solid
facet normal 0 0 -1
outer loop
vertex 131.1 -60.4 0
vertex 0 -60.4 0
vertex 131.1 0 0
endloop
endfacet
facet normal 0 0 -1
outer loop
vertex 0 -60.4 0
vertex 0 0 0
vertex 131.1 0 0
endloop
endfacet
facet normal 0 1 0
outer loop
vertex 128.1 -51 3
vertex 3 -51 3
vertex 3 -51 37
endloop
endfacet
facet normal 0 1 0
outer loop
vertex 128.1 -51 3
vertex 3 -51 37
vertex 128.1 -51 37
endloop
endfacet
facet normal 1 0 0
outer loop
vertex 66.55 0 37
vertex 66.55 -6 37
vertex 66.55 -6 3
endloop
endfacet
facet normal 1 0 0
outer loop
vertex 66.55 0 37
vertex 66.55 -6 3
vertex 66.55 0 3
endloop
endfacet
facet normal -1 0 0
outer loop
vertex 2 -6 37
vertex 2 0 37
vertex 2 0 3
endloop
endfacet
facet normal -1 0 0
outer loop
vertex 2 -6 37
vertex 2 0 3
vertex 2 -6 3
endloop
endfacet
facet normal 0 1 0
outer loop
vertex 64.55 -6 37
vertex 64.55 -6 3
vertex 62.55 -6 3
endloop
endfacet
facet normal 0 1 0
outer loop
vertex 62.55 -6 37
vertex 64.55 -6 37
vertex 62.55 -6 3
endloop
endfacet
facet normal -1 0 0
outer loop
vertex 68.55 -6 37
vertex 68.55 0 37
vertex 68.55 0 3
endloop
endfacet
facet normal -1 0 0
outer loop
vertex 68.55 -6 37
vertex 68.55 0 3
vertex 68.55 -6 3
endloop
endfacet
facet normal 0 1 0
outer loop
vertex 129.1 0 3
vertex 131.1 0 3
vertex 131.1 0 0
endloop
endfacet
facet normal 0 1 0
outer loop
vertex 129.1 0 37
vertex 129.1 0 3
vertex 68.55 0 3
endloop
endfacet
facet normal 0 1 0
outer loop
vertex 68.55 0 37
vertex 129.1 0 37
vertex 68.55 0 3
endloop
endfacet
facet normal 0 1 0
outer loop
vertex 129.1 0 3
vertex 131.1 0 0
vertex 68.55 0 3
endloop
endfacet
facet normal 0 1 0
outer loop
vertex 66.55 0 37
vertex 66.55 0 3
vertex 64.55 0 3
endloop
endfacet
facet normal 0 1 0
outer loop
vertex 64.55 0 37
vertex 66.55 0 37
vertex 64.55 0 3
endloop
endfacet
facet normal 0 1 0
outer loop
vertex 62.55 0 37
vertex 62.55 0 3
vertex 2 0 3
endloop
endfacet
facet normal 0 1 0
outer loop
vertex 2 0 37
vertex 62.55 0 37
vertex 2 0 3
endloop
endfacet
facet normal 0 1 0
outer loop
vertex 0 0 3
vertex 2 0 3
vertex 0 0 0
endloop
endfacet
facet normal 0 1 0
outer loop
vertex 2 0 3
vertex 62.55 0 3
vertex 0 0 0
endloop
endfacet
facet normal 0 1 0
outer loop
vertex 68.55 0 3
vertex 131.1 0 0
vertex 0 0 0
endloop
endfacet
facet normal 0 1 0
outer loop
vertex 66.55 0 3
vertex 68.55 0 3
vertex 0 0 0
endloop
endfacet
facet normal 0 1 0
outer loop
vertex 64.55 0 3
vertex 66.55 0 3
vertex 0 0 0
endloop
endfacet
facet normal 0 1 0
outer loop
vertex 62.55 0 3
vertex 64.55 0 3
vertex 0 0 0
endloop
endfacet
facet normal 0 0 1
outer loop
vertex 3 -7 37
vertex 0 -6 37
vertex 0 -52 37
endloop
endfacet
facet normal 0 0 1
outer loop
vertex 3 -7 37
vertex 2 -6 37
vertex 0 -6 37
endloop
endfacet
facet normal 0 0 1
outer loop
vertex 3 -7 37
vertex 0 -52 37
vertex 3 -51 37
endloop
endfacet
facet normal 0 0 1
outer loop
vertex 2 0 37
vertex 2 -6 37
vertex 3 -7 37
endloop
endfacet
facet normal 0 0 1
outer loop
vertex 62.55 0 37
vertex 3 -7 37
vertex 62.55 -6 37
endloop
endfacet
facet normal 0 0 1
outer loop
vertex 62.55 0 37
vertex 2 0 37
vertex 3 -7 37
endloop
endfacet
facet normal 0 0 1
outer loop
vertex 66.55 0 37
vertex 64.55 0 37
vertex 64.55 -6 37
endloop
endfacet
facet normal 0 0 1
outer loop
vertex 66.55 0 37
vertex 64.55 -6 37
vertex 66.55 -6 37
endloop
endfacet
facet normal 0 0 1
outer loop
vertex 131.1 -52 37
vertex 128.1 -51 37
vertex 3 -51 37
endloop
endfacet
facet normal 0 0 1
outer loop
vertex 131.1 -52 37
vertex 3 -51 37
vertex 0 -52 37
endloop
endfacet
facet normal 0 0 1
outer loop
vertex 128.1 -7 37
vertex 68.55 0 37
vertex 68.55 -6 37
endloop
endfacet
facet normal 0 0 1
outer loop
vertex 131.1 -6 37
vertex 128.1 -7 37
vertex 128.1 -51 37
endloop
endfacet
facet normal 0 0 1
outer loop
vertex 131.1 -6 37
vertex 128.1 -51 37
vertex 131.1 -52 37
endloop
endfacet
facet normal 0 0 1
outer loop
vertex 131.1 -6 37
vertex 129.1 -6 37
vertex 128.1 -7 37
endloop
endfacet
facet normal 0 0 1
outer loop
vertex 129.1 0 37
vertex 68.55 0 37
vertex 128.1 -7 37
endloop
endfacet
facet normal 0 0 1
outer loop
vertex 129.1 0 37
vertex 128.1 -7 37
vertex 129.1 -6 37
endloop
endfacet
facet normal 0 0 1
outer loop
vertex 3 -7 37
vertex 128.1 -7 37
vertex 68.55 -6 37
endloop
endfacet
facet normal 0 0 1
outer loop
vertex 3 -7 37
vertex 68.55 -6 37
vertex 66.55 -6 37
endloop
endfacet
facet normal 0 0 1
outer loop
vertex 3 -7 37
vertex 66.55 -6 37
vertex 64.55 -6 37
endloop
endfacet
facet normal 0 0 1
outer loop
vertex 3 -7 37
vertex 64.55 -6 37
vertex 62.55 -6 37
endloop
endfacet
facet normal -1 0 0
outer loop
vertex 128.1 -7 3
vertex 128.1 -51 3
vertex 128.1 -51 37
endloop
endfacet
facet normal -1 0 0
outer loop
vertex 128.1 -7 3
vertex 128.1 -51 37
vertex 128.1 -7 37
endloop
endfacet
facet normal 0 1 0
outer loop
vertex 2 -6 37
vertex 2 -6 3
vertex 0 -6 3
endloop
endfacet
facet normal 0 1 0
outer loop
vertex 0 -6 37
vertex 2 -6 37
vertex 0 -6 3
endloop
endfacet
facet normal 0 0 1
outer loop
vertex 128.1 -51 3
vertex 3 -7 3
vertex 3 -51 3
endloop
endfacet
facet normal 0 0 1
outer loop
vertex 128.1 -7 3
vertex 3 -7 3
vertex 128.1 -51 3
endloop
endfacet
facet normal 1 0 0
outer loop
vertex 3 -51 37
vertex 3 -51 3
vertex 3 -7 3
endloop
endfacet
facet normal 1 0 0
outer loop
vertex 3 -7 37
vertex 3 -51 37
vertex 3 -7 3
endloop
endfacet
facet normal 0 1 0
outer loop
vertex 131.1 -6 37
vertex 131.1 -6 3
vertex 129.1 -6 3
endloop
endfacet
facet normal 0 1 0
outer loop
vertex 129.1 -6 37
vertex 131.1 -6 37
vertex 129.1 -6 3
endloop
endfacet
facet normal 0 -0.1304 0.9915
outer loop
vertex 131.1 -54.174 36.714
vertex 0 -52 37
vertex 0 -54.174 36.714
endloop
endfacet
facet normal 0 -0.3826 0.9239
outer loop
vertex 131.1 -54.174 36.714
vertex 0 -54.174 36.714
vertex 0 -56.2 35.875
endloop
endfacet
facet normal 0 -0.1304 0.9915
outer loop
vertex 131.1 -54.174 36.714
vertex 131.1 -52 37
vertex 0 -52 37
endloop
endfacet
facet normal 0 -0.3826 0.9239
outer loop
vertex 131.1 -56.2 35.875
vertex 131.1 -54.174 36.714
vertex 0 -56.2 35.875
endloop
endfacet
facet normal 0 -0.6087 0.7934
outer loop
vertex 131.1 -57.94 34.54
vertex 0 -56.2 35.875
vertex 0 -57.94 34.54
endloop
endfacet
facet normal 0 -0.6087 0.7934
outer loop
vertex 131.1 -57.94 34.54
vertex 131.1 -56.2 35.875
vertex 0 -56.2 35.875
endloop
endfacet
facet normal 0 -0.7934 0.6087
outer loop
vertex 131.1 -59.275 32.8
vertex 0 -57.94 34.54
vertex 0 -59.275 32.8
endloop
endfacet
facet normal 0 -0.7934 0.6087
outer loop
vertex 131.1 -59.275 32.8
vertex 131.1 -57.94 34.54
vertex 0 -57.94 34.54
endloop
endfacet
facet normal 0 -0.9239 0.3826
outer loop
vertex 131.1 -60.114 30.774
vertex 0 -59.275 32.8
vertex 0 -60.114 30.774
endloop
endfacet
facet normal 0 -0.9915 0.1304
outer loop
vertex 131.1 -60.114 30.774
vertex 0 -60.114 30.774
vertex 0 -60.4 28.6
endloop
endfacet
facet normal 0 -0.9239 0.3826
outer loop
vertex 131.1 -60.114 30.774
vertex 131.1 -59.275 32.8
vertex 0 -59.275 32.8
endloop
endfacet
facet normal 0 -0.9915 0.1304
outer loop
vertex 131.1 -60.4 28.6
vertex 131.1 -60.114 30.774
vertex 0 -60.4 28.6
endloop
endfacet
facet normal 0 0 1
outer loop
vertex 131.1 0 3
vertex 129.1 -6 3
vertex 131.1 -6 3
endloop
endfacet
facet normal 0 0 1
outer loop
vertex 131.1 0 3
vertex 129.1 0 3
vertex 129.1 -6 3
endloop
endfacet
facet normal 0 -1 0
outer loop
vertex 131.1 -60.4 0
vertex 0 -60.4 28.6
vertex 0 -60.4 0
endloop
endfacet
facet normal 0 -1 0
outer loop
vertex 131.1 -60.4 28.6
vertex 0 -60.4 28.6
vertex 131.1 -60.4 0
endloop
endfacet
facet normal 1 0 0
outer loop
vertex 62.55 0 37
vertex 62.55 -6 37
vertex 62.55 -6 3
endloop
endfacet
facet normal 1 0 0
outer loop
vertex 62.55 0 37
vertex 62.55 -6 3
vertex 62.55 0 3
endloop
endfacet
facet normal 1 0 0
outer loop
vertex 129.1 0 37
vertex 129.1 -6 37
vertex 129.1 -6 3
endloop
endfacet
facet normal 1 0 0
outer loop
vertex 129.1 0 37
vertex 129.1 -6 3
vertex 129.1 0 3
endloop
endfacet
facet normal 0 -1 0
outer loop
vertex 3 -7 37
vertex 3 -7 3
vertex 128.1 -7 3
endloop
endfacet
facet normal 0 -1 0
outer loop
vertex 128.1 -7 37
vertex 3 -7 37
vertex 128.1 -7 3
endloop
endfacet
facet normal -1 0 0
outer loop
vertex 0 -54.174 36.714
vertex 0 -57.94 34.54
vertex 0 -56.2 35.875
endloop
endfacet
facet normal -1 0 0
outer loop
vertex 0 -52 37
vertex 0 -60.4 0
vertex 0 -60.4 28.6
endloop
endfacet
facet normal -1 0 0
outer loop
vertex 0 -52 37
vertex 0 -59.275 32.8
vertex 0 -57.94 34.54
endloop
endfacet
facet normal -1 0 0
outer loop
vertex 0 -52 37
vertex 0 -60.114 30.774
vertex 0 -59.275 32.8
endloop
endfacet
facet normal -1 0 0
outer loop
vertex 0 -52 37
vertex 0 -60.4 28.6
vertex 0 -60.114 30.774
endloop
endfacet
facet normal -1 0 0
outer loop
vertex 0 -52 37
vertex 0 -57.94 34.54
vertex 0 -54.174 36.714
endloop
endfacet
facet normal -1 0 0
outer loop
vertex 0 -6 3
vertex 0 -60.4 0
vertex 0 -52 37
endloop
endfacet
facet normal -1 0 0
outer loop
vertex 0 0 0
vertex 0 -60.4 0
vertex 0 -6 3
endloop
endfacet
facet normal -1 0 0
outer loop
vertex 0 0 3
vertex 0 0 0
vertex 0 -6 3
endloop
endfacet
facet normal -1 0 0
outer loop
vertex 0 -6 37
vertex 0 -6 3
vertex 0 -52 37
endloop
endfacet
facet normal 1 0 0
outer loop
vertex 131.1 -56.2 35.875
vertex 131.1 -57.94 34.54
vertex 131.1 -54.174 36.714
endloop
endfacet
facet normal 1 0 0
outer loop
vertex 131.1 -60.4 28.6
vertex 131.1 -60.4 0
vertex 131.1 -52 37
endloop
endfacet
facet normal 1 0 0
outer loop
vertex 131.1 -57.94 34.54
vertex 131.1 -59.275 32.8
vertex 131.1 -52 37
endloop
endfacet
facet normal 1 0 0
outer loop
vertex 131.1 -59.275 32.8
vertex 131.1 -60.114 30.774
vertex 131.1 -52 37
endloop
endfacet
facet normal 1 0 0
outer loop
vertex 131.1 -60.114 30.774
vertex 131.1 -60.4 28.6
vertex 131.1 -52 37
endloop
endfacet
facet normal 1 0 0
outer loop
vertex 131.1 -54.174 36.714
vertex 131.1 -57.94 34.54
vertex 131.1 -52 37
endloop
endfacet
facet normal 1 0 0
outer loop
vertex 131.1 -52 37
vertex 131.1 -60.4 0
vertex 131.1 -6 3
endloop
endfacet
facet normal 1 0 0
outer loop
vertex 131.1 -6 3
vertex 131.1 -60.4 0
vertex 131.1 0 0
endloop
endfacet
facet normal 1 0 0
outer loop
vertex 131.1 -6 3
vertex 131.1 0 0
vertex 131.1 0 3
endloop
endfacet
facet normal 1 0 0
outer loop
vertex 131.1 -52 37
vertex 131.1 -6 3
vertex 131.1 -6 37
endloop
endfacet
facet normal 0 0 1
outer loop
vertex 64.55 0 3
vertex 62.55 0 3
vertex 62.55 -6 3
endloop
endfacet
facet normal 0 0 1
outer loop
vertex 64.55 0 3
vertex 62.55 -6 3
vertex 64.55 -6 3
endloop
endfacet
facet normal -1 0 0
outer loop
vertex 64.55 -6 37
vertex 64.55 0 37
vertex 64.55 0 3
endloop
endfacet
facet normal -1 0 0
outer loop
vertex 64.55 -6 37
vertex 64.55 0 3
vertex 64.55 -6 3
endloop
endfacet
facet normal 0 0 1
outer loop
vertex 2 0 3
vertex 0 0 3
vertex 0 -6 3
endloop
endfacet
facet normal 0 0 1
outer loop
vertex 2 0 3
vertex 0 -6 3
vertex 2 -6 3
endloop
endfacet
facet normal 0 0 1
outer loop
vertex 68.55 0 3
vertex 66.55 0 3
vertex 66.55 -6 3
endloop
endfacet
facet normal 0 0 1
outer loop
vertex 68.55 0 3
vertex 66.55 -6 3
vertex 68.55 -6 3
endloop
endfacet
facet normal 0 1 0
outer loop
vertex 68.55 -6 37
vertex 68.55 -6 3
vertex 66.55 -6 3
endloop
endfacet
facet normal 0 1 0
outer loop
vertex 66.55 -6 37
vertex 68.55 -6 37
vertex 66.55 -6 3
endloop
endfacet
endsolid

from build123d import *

# Parameters (mm, degrees)
CROQUIS2_W              = 131.1
CROQUIS2_H              = 54
SALIENTE_EXTRUIR2_DEPTH = 3
CROQUIS3_W              = 125.1
CROQUIS3_H              = 44
SALIENTE_EXTRUIR3_DEPTH = 34
CROQUIS4_W              = 131.1
CROQUIS4_H              = 37
SALIENTE_EXTRUIR4_DEPTH = 6.4
REDONDEO2_R             = 8.4


with BuildPart() as part:
    # Croquis2 → Saliente-Extruir2 (new body)
    with BuildSketch(Plane.XY):
        with Locations((65.55, -27)):
            Rectangle(CROQUIS2_W, CROQUIS2_H)
    extrude(amount=SALIENTE_EXTRUIR2_DEPTH)

    # Croquis3 → Saliente-Extruir3 (add)
    with BuildSketch(Plane.XY.offset(3)):
        Polygon((2, -6), (0, -6), (0, -54), (131.1, -54), (131.1, -6), (129.1, -6), (129.1, 0), (68.55, 0), (68.55, -6), (66.55, -6), (66.55, 0), (65.55, 0), (64.55, 0), (64.55, -6), (62.55, -6), (62.55, 0), (2, 0), align=None)
        with Locations((65.55, -29)):
            Rectangle(CROQUIS3_W, CROQUIS3_H, mode=Mode.SUBTRACT)
    extrude(amount=SALIENTE_EXTRUIR3_DEPTH)

    # Croquis4 → Saliente-Extruir4 (add)
    with BuildSketch(Plane.XZ.offset(54)):
        with Locations((65.55, 18.5)):
            Rectangle(CROQUIS4_W, CROQUIS4_H)
    extrude(amount=SALIENTE_EXTRUIR4_DEPTH)

    # Redondeo2
    redondeo2_edges = [part.edges().sort_by_distance(p)[0] for p in [
        (65.55, -60.4, 37),
    ]]
    fillet(redondeo2_edges, radius=REDONDEO2_R)


solid = part.part
